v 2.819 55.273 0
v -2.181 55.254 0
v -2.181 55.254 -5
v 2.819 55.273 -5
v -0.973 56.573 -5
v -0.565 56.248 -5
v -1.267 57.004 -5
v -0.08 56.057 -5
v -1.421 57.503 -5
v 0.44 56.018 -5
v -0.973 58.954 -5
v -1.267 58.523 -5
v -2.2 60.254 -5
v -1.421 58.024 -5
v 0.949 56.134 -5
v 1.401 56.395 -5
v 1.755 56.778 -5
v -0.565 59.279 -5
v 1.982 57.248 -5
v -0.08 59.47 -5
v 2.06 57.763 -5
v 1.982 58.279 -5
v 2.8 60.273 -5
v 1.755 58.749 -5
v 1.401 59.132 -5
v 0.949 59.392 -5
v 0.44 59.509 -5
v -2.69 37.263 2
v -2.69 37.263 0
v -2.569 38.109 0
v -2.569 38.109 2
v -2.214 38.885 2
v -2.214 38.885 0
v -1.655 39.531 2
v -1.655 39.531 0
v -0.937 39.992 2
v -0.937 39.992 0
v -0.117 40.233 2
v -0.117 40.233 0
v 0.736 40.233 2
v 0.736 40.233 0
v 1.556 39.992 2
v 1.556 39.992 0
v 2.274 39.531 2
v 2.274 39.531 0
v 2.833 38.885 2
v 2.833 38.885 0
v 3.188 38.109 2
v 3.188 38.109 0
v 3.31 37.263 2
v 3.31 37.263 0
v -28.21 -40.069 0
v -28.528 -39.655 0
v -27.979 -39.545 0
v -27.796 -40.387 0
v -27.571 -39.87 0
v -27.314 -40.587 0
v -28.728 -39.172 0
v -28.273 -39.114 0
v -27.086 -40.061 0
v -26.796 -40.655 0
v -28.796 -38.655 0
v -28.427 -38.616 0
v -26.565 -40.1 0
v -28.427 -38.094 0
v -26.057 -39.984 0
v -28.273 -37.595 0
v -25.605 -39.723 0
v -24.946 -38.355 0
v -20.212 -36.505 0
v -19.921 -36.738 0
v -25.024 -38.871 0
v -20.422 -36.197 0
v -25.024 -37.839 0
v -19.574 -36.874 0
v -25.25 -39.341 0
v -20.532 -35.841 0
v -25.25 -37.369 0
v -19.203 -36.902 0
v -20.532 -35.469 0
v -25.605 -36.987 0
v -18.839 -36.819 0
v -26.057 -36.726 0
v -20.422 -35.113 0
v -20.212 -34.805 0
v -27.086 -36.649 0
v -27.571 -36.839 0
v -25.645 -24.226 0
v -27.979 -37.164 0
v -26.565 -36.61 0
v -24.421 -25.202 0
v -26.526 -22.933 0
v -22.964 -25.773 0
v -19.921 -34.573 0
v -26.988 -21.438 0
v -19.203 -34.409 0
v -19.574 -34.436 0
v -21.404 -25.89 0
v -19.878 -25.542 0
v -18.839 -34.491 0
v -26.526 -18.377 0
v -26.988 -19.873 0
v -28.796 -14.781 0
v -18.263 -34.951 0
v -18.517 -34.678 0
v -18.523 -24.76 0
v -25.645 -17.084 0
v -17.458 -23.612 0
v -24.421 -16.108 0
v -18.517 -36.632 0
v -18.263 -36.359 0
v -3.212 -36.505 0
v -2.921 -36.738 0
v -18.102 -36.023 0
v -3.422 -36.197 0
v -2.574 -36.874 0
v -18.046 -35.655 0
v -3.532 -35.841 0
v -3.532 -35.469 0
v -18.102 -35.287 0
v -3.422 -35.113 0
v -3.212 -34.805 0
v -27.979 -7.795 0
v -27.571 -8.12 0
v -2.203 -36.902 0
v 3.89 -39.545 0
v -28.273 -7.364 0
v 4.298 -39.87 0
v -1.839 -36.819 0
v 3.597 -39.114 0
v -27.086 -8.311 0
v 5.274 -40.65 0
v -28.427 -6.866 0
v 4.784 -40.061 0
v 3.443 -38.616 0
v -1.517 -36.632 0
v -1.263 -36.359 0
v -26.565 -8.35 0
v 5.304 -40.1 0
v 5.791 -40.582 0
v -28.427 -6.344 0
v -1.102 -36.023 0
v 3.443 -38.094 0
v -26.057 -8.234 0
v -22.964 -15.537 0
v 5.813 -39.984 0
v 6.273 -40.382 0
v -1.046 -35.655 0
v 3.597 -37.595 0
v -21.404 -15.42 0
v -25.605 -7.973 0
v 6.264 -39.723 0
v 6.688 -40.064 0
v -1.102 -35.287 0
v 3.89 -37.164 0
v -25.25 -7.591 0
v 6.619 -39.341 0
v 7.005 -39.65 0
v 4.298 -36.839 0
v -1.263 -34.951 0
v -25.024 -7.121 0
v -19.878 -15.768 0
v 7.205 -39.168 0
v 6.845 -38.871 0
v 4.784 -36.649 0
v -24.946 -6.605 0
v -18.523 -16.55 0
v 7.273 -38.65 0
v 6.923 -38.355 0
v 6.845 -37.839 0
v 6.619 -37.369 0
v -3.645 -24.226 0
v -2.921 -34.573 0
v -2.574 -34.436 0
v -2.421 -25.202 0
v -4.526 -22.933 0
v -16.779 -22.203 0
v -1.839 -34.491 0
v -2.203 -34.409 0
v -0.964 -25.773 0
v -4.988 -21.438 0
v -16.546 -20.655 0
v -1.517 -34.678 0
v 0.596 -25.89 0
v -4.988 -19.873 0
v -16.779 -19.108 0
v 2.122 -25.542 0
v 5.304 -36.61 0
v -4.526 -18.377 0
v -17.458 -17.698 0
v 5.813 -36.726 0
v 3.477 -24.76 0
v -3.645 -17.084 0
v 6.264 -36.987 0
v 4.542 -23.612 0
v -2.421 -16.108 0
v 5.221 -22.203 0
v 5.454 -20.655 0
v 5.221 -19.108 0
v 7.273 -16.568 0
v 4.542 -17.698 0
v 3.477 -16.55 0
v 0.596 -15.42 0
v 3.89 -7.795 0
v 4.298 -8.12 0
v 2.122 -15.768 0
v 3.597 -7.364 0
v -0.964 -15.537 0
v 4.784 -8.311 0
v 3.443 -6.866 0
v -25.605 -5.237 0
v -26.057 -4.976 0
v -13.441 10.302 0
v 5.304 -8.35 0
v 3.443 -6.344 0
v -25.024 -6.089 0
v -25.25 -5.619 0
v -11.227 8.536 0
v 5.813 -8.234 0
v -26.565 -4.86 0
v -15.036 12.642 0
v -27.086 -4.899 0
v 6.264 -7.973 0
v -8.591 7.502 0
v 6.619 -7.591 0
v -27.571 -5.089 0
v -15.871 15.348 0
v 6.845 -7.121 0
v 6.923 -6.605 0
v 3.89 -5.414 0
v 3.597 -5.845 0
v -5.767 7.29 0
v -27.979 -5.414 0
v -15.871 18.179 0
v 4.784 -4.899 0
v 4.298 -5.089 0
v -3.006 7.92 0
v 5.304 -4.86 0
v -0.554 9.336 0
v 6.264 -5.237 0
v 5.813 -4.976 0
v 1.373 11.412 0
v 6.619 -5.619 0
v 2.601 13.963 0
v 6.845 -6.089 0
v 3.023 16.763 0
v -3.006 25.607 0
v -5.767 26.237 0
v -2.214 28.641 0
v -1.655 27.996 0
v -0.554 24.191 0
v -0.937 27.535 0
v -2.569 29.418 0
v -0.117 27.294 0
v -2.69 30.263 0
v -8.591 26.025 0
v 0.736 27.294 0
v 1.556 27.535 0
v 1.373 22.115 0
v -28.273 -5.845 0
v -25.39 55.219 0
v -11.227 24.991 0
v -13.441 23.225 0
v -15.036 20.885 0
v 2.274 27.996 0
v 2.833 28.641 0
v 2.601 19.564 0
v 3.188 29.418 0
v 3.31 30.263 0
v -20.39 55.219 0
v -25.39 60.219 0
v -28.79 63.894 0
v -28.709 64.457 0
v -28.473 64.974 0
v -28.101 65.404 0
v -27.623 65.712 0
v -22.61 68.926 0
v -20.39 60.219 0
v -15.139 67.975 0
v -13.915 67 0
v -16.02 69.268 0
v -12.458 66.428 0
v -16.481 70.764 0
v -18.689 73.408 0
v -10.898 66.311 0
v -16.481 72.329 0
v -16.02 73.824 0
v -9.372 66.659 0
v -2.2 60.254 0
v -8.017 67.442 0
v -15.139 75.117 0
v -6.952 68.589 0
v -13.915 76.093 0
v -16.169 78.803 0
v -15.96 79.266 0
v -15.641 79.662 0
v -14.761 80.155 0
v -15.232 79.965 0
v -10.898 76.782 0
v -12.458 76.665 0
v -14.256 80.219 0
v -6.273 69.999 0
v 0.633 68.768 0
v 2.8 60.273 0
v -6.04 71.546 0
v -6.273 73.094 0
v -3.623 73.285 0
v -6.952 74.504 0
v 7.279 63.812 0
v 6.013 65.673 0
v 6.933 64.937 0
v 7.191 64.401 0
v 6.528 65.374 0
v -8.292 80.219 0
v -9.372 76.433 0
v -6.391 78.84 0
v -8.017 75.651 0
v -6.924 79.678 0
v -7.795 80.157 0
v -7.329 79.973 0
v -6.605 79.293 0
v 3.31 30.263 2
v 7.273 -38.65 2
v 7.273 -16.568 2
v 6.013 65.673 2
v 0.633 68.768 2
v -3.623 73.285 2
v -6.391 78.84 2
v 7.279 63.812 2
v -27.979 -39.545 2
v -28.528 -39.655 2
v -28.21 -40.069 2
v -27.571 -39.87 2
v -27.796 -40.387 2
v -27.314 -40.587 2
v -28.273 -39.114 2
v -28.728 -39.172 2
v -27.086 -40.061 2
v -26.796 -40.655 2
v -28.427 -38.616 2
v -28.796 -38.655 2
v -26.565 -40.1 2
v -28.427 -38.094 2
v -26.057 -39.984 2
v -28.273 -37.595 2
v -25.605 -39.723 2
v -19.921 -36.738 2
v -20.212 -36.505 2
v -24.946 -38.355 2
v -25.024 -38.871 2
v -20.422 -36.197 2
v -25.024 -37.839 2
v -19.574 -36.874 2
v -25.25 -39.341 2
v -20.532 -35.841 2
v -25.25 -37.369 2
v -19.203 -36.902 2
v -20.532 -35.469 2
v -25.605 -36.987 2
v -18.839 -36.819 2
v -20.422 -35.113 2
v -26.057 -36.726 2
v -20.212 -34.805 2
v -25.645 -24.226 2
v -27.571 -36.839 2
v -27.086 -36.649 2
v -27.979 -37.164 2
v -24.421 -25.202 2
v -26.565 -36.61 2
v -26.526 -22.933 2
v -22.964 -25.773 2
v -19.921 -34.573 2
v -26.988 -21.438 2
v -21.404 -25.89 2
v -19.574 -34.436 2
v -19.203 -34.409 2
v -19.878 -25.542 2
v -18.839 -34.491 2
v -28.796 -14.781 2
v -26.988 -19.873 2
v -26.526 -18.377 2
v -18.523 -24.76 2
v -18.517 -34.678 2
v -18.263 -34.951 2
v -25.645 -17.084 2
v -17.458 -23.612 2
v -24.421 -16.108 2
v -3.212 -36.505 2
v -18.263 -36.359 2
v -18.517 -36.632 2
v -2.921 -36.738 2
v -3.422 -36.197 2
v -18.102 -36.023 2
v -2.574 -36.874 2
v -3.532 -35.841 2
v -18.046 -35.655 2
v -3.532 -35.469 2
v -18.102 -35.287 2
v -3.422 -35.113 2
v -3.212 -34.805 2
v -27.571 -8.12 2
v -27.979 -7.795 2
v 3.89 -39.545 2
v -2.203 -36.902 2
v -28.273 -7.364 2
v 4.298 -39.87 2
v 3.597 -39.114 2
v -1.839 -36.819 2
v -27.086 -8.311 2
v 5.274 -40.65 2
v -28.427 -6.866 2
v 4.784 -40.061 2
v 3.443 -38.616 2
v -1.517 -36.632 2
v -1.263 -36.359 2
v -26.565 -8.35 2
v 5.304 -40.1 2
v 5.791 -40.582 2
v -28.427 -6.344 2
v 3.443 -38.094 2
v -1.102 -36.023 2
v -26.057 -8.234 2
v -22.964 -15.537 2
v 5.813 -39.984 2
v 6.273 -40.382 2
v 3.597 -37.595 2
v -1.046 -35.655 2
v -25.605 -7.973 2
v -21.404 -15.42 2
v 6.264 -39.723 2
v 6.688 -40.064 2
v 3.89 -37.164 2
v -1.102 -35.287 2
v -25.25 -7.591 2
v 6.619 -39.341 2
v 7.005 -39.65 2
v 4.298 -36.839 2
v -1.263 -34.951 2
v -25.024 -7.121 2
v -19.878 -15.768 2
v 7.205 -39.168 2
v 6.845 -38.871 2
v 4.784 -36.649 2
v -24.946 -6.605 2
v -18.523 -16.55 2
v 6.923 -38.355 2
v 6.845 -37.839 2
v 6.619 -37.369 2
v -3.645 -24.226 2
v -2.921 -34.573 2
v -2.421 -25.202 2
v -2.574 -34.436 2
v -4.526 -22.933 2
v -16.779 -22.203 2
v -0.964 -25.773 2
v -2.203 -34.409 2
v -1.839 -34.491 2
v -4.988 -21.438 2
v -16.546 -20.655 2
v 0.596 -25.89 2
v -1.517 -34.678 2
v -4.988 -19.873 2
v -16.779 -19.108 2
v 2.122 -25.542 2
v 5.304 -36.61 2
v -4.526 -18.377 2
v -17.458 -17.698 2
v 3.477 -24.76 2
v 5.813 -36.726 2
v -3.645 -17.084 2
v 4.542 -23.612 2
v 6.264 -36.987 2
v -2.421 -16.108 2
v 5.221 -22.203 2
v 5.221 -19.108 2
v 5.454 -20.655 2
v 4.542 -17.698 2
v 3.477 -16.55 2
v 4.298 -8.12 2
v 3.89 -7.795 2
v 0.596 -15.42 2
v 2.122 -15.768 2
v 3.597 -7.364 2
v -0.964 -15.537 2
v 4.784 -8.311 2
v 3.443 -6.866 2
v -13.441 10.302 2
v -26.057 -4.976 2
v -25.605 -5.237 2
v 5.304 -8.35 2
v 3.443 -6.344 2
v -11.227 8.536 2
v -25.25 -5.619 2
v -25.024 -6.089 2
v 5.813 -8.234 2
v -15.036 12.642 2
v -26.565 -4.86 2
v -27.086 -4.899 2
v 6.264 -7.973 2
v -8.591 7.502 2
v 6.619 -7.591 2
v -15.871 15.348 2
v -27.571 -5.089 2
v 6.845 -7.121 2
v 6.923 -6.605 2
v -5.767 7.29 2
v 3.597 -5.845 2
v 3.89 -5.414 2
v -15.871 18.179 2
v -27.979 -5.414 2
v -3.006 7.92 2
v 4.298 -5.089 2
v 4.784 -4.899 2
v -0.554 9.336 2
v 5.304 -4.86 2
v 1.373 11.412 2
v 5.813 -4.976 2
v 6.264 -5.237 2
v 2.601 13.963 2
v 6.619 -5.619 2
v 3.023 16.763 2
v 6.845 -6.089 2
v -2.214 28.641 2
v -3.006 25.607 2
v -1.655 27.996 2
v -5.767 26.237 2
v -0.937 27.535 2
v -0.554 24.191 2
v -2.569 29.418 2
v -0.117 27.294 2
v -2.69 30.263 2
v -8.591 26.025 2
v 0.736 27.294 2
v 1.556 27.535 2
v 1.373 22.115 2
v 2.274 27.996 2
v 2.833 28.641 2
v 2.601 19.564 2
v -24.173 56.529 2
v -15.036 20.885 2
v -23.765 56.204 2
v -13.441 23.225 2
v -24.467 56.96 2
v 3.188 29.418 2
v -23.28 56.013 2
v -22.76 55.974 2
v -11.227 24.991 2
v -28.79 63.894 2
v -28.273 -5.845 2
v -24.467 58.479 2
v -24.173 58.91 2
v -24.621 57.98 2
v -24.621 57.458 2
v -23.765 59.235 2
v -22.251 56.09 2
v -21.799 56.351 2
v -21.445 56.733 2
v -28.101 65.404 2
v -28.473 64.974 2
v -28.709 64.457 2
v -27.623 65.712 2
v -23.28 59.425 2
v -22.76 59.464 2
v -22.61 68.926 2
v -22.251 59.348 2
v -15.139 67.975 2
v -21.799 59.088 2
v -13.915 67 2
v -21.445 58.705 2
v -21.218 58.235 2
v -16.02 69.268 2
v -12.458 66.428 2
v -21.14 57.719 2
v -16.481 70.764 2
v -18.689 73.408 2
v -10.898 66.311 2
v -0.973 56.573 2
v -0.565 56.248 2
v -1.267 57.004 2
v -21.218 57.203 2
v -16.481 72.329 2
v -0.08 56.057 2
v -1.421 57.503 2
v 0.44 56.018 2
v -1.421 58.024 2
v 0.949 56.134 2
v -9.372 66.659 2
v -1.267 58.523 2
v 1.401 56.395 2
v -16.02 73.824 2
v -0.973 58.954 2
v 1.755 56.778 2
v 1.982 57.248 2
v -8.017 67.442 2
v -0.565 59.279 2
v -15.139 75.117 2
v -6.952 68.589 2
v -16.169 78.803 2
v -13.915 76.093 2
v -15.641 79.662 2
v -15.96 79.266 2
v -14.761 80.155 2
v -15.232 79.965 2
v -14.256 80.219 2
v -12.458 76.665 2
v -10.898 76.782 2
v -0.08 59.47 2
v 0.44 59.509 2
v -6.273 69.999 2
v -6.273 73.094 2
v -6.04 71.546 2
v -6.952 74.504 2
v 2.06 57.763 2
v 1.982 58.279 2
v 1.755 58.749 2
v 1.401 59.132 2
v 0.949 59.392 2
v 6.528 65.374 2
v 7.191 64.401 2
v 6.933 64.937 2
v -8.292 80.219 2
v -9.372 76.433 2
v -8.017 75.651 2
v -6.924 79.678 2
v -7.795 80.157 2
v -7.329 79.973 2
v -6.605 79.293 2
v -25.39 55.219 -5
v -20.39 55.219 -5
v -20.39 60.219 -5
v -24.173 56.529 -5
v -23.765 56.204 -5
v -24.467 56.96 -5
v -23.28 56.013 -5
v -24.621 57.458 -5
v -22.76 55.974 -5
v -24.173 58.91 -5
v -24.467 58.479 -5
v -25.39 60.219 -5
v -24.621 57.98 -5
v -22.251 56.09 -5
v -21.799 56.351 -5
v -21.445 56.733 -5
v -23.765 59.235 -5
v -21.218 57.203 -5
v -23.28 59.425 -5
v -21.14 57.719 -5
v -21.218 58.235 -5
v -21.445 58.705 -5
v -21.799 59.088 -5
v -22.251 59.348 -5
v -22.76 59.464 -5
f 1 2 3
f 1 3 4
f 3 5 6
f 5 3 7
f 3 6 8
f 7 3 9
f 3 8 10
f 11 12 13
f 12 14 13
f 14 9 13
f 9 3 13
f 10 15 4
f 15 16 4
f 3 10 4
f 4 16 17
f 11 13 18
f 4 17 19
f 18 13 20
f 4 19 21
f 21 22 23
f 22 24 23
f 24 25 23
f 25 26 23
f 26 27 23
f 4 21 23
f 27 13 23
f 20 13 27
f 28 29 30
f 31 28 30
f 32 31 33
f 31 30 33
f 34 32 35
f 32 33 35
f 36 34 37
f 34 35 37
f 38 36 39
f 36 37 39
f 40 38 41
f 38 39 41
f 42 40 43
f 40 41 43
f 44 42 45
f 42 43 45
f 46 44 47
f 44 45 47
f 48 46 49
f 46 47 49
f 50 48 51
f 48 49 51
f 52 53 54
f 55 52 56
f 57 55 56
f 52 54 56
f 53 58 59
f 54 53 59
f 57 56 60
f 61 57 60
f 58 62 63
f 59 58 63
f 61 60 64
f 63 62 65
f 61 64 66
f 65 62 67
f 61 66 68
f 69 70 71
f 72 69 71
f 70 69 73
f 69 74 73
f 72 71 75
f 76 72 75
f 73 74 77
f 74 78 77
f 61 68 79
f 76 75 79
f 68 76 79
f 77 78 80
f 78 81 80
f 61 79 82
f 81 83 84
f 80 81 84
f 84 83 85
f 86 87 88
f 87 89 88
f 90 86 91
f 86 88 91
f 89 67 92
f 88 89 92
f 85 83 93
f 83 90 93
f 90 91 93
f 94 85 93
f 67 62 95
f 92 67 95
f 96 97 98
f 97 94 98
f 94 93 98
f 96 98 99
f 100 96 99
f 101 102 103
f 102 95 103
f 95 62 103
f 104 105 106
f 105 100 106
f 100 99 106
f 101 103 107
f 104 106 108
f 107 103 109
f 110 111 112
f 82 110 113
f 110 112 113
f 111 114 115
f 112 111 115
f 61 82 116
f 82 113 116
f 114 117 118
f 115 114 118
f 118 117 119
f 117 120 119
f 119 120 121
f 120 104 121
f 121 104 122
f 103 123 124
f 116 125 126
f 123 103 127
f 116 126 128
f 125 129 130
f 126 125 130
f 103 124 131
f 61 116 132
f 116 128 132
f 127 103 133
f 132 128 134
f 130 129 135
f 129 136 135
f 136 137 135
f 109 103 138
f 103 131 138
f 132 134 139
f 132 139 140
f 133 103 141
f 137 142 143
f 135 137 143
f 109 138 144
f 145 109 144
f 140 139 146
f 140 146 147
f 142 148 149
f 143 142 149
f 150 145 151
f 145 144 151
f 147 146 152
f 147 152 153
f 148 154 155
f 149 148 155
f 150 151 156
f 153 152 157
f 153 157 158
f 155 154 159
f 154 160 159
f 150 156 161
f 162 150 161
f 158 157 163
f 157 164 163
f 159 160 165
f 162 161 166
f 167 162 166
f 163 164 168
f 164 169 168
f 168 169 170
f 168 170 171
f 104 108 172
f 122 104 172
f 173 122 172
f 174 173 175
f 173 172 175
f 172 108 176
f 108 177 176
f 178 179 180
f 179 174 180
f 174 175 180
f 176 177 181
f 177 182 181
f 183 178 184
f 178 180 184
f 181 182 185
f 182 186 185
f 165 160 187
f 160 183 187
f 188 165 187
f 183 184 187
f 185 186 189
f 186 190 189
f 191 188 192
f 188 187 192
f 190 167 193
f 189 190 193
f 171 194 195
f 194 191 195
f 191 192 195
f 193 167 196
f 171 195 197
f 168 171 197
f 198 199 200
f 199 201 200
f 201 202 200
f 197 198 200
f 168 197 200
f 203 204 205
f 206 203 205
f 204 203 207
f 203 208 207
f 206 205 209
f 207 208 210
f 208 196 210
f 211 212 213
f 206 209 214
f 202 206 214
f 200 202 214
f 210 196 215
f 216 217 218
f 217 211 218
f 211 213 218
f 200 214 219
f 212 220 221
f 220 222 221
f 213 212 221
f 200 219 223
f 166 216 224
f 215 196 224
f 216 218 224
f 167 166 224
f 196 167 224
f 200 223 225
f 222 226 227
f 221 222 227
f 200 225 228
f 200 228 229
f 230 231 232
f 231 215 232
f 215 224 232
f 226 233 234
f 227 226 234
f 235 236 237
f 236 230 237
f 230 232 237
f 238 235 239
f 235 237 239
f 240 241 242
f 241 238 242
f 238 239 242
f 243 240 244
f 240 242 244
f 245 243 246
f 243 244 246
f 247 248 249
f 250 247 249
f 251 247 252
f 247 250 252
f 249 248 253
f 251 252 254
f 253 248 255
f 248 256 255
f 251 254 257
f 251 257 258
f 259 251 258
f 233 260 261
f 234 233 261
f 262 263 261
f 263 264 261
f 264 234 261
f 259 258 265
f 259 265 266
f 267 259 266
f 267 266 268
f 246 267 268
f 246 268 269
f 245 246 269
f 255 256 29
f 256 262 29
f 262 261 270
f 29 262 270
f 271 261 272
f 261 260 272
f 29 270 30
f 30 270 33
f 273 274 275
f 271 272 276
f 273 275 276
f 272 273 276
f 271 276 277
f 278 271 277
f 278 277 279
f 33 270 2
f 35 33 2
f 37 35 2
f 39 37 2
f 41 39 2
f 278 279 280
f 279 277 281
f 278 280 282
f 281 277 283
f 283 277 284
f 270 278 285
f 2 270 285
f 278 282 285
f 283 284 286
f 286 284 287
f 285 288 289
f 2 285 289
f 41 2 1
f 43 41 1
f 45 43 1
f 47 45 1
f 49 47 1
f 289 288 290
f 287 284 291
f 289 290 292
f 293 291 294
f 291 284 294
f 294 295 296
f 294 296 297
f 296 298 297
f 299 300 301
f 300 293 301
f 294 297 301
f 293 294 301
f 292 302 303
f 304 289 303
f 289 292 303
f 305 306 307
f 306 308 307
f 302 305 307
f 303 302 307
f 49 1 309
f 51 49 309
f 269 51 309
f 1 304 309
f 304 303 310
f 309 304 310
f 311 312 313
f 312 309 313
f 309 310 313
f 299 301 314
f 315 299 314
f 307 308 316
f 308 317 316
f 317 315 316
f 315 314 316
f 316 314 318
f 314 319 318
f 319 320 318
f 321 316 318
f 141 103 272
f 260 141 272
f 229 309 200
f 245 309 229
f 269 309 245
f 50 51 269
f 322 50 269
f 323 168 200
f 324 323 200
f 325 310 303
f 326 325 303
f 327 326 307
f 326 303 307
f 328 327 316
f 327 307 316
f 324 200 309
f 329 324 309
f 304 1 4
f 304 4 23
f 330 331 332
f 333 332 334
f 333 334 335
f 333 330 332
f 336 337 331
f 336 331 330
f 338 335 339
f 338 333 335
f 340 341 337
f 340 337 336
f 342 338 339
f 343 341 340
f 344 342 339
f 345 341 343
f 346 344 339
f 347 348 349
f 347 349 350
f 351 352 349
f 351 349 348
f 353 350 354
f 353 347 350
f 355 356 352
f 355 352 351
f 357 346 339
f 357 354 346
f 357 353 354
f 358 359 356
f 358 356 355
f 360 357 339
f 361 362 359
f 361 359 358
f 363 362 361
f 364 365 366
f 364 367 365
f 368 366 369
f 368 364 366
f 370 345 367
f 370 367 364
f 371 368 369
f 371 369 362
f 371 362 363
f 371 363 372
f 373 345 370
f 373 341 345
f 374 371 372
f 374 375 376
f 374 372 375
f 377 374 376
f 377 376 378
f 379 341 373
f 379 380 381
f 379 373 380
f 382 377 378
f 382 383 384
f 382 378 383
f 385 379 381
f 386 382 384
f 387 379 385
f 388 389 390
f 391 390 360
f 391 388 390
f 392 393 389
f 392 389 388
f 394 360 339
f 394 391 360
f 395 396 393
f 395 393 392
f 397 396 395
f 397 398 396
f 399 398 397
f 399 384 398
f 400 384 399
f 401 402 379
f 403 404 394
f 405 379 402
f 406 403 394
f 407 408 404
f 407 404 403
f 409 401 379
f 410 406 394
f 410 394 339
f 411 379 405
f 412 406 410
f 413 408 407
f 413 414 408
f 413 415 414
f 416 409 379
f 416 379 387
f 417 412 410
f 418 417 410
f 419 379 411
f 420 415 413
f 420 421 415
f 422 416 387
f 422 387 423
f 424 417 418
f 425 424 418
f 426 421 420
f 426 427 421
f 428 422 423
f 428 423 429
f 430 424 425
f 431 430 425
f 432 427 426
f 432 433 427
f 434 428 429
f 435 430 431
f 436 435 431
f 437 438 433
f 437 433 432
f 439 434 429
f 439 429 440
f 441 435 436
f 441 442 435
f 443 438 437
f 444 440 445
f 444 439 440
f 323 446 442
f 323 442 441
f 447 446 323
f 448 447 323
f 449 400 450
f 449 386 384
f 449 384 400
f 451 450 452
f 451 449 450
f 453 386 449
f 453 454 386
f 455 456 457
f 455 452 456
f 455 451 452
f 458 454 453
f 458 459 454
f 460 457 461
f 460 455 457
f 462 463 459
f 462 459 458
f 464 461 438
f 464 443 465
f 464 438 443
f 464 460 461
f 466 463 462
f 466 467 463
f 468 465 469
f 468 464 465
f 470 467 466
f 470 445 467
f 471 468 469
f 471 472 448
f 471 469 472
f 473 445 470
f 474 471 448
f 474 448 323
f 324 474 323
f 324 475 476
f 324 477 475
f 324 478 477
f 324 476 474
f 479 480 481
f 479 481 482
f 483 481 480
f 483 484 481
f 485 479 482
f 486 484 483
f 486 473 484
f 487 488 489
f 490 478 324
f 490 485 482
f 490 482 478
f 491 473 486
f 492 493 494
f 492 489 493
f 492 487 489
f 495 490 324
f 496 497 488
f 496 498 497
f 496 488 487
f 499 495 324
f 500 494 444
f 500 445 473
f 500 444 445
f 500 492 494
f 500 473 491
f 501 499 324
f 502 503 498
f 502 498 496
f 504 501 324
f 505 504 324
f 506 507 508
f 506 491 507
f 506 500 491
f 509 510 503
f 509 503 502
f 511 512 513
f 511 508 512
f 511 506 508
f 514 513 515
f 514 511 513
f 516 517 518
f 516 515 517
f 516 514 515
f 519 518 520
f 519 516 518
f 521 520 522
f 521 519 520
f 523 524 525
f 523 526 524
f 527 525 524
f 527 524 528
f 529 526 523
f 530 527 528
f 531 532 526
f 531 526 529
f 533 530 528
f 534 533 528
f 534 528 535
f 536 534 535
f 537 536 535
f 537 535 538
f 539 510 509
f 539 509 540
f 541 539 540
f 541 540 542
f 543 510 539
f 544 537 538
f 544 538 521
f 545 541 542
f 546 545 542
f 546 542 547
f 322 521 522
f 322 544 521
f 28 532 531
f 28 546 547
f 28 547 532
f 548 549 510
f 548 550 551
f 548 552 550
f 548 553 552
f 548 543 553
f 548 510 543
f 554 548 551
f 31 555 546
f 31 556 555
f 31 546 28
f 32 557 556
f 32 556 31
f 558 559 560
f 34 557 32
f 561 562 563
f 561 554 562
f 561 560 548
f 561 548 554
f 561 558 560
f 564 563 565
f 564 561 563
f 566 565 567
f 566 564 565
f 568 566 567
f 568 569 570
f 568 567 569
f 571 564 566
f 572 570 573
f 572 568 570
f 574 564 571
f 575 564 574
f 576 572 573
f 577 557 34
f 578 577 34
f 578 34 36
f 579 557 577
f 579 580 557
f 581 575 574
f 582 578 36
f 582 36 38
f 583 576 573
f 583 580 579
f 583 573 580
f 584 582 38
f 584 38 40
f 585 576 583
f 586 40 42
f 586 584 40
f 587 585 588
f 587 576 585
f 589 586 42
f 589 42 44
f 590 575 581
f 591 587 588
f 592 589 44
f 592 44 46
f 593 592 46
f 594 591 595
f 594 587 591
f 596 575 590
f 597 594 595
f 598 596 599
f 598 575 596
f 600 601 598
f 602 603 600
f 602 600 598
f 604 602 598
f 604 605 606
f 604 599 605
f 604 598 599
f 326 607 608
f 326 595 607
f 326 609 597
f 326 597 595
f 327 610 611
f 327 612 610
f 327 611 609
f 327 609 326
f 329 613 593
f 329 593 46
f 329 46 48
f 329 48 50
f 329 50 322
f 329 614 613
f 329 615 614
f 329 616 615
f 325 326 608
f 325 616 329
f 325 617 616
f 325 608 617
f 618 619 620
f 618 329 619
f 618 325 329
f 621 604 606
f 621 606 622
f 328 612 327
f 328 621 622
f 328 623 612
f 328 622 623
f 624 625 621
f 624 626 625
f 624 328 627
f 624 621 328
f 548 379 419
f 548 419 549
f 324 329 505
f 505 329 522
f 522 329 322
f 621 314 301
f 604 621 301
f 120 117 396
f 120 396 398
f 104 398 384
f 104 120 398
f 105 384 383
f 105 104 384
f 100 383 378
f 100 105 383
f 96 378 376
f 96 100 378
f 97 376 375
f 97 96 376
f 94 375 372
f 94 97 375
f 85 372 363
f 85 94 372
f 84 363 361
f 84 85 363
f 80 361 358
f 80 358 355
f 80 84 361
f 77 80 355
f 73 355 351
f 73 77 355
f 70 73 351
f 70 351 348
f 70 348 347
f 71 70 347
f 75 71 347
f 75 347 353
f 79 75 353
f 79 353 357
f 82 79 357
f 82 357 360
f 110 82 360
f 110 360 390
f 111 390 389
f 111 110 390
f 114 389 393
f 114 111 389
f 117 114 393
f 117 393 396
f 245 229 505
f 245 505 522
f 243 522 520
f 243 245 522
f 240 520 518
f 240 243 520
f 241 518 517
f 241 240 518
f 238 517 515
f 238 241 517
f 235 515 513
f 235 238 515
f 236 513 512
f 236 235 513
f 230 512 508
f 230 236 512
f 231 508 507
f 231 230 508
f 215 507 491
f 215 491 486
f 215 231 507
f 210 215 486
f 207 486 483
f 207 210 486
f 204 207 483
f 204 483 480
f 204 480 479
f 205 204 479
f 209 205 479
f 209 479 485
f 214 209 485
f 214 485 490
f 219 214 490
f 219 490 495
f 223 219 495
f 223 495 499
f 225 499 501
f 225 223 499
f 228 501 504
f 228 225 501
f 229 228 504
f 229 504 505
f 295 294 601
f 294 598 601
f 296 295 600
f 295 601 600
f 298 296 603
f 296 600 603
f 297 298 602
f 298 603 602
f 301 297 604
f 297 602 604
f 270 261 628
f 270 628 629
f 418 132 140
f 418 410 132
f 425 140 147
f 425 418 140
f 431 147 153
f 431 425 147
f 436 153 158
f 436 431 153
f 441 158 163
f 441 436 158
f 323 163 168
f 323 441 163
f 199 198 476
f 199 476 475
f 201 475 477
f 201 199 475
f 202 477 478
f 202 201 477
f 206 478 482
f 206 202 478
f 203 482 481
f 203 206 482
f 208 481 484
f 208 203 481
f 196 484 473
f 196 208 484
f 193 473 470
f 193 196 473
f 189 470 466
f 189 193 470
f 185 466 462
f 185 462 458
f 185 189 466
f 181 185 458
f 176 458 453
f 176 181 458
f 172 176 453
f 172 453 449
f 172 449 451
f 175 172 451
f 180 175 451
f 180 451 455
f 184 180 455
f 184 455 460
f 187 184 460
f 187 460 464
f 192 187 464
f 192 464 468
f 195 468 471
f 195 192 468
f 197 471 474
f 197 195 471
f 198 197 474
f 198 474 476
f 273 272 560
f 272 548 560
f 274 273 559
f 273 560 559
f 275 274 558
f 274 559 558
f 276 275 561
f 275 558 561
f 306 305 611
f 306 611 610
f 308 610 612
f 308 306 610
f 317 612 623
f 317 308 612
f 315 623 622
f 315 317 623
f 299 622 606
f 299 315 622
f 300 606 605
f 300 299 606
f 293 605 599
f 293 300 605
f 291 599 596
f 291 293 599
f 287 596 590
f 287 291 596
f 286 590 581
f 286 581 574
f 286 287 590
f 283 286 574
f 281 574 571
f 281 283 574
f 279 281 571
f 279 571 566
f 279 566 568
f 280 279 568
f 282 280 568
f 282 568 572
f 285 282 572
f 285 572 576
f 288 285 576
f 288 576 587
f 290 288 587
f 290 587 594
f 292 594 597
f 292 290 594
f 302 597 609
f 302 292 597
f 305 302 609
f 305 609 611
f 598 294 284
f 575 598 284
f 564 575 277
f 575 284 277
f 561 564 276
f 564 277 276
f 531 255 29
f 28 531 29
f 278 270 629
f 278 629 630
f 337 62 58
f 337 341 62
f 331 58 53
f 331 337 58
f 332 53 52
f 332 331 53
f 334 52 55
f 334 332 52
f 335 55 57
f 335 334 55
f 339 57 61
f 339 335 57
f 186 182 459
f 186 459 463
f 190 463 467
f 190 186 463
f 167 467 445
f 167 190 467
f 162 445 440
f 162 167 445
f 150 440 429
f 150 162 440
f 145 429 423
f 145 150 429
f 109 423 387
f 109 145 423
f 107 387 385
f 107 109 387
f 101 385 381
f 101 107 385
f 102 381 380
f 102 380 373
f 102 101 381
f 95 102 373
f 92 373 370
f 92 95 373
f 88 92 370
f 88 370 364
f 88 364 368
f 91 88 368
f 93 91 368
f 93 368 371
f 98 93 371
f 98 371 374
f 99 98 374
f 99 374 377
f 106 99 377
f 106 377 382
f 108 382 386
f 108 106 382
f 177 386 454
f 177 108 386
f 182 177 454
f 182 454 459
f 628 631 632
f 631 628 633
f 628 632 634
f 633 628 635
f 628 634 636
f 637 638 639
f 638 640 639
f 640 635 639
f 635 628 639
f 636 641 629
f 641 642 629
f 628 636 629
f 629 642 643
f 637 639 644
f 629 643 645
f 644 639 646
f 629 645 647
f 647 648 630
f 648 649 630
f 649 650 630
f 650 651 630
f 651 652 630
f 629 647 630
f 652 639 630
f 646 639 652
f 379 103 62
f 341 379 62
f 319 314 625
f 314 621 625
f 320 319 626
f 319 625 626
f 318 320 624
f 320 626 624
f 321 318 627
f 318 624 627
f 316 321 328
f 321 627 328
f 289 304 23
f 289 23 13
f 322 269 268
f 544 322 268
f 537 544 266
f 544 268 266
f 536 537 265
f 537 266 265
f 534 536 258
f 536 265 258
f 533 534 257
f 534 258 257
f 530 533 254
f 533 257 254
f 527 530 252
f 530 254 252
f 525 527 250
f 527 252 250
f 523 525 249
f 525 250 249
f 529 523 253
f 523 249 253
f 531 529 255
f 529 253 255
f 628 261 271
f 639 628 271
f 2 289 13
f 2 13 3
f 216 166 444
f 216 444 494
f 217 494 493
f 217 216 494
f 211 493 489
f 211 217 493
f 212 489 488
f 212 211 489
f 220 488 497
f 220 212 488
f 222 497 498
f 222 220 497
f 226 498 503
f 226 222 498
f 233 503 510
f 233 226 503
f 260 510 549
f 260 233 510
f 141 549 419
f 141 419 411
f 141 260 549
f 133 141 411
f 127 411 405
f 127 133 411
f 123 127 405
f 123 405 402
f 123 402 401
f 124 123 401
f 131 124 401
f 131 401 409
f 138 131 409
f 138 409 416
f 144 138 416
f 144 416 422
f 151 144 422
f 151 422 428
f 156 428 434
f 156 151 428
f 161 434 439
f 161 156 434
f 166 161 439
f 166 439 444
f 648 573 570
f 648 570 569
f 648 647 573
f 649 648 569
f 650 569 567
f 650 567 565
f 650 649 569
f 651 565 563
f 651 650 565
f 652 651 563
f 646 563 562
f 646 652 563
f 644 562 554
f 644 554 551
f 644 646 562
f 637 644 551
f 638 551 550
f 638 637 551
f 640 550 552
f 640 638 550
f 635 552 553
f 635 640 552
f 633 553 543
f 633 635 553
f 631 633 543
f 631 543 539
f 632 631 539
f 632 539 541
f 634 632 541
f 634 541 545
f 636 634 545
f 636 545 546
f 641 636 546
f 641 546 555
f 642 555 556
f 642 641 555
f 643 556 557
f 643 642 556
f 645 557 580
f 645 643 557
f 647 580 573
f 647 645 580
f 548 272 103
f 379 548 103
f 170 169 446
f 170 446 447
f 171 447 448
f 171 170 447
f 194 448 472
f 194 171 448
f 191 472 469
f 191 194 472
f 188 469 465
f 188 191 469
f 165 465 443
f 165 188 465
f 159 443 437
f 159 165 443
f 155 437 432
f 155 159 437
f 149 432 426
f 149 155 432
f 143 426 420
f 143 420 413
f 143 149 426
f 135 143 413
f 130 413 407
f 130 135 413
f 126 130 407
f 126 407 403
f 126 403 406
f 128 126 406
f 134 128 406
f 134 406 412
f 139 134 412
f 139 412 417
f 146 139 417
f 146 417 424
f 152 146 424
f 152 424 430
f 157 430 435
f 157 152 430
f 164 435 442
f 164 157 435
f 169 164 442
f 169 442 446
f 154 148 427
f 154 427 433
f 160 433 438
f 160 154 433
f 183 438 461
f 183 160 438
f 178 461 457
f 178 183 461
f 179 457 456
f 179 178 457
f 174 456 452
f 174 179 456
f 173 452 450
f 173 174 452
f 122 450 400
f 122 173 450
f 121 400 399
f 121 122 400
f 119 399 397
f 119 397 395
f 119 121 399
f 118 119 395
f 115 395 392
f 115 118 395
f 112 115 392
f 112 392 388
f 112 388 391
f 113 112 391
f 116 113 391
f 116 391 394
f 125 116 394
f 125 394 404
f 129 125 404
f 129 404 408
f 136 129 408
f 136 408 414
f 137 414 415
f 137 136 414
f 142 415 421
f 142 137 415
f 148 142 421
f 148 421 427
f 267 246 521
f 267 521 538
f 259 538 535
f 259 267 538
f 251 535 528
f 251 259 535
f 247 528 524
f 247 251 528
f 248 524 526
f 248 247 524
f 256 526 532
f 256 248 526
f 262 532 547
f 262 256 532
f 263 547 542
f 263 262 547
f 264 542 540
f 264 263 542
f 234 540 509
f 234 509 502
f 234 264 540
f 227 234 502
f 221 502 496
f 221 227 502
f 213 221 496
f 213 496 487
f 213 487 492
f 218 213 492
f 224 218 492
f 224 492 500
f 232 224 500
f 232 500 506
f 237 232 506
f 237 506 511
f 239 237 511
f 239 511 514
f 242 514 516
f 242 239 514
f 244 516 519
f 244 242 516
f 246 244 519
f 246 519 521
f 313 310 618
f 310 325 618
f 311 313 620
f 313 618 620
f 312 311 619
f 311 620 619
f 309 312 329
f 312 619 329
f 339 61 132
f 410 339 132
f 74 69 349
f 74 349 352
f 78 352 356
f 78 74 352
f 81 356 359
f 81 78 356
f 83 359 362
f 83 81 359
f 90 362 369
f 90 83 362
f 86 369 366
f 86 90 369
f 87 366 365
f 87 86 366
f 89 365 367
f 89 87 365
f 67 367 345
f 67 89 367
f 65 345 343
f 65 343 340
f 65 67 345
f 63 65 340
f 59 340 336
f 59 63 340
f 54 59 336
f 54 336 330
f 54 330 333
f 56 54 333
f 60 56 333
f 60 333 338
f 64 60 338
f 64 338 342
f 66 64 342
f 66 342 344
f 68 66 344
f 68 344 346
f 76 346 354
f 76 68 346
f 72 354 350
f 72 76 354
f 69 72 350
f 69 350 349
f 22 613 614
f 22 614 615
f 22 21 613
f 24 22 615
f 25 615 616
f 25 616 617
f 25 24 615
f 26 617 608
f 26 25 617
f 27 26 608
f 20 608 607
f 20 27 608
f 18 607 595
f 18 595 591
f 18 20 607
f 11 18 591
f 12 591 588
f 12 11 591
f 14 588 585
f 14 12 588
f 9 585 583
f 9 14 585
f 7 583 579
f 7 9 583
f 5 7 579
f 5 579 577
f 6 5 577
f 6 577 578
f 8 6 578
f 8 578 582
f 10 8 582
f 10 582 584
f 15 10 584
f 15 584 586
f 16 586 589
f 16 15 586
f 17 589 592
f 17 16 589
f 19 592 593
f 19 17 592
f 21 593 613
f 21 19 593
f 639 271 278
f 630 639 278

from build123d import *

# Parameters (mm, degrees)
F0_R     = 1.75
F0_R_2   = 5.25
F0_R_3   = 1.25
F0_R_4   = 9.5
F0_W     = 5
F0_H     = 5
F1_DEPTH = 2
F2_DEPTH = 5
F3_R     = 2


with BuildPart() as f1:
    # F0 (on Top) → F1 (new body)
    with BuildSketch(Plane.XY):
        Polygon((-28.790083, 65.219305), (-28.796145, -14.780695), (-28.796145, -16.571802), (-28.796145, -40.655049), (7.273224, -40.649858), (7.273224, -16.567812), (7.279287, 65.219305), (5.209917, 65.219305), align=None)
        with Locations((-26.696145, -38.354747)):
            Circle(F0_R, mode=Mode.SUBTRACT)
        with Locations((-21.796145, -20.655049)):
            Circle(F0_R_2, mode=Mode.SUBTRACT)
        with Locations((-19.296145, -35.655049)):
            Circle(F0_R_3, mode=Mode.SUBTRACT)
        with Locations((-26.696145, -6.604747)):
            Circle(F0_R, mode=Mode.SUBTRACT)
        with Locations((-2.296145, -35.655049)):
            Circle(F0_R_3, mode=Mode.SUBTRACT)
        with Locations((5.173224, -38.354747)):
            Circle(F0_R, mode=Mode.SUBTRACT)
        with Locations((0.203855, -20.655049)):
            Circle(F0_R_2, mode=Mode.SUBTRACT)
        with Locations((-6.476738, 16.763415)):
            Circle(F0_R_4, mode=Mode.SUBTRACT)
        with Locations((5.173224, -6.604747)):
            Circle(F0_R, mode=Mode.SUBTRACT)
        with Locations((-22.890444, 57.719305)):
            Rectangle(F0_W, F0_H, mode=Mode.SUBTRACT)
        with BuildLine():
            ThreePointArc((-2.690486, 37.263415), (0.309514, 40.263415), (3.309514, 37.263415))
            Line((3.309514, 37.263415), (3.309514, 30.263415))
            ThreePointArc((3.309514, 30.263415), (0.309514, 27.263415), (-2.690486, 30.263415))
            Line((-2.690486, 30.263415), (-2.690486, 37.263415))
        make_face(mode=Mode.SUBTRACT)
        Polygon((-2.180962, 55.253926), (-2.199975, 60.25389), (2.799989, 60.272903), (2.819002, 55.272939), align=None, mode=Mode.SUBTRACT)
        with Locations((-22.890444, 57.719305)):
            Rectangle(F0_W, F0_H)
        with Locations((-22.890444, 57.719305)):
            Circle(F0_R, mode=Mode.SUBTRACT)
        Polygon((2.799989, 60.272903), (-2.199975, 60.25389), (-2.180962, 55.253926), (2.819002, 55.272939), align=None)
        with Locations((0.309514, 57.763415)):
            Circle(F0_R, mode=Mode.SUBTRACT)
        with BuildLine():
            ThreePointArc((-15.790083, 80.219305), (-20.42596, 71.103733), (-28.790083, 65.219305))
            Line((-28.790083, 65.219305), (5.209917, 65.219305))
            Line((5.209917, 65.219305), (7.279287, 65.219305))
            ThreePointArc((7.279287, 65.219305), (-1.691726, 70.903111), (-6.790083, 80.219305))
            Line((-6.790083, 80.219305), (-15.790083, 80.219305))
        make_face()
        with Locations((-11.290083, 71.546383)):
            Circle(F0_R_2, mode=Mode.SUBTRACT)
    extrude(amount=F1_DEPTH)

    # F0 (on Top) → F2 (join)
    with BuildSketch(Plane.XY):
        Polygon((2.799989, 60.272903), (-2.199975, 60.25389), (-2.180962, 55.253926), (2.819002, 55.272939), align=None)
        with Locations((0.309514, 57.763415)):
            Circle(F0_R, mode=Mode.SUBTRACT)
        with Locations((-22.890444, 57.719305)):
            Rectangle(F0_W, F0_H)
        with Locations((-22.890444, 57.719305)):
            Circle(F0_R, mode=Mode.SUBTRACT)
    extrude(amount=-F2_DEPTH)

    # F3
    f3_edges = [f1.edges().sort_by_distance(p)[0] for p in [
        (-28.790083, 65.219305, 1),
        (7.279287, 65.219305, 1),
        (7.273224, -40.649858, 1),
        (-28.796145, -40.655049, 1),
        (-15.790083, 80.219305, 1),
        (-6.790083, 80.219305, 1),
    ]]
    fillet(f3_edges, radius=F3_R)


solid = f1.part
